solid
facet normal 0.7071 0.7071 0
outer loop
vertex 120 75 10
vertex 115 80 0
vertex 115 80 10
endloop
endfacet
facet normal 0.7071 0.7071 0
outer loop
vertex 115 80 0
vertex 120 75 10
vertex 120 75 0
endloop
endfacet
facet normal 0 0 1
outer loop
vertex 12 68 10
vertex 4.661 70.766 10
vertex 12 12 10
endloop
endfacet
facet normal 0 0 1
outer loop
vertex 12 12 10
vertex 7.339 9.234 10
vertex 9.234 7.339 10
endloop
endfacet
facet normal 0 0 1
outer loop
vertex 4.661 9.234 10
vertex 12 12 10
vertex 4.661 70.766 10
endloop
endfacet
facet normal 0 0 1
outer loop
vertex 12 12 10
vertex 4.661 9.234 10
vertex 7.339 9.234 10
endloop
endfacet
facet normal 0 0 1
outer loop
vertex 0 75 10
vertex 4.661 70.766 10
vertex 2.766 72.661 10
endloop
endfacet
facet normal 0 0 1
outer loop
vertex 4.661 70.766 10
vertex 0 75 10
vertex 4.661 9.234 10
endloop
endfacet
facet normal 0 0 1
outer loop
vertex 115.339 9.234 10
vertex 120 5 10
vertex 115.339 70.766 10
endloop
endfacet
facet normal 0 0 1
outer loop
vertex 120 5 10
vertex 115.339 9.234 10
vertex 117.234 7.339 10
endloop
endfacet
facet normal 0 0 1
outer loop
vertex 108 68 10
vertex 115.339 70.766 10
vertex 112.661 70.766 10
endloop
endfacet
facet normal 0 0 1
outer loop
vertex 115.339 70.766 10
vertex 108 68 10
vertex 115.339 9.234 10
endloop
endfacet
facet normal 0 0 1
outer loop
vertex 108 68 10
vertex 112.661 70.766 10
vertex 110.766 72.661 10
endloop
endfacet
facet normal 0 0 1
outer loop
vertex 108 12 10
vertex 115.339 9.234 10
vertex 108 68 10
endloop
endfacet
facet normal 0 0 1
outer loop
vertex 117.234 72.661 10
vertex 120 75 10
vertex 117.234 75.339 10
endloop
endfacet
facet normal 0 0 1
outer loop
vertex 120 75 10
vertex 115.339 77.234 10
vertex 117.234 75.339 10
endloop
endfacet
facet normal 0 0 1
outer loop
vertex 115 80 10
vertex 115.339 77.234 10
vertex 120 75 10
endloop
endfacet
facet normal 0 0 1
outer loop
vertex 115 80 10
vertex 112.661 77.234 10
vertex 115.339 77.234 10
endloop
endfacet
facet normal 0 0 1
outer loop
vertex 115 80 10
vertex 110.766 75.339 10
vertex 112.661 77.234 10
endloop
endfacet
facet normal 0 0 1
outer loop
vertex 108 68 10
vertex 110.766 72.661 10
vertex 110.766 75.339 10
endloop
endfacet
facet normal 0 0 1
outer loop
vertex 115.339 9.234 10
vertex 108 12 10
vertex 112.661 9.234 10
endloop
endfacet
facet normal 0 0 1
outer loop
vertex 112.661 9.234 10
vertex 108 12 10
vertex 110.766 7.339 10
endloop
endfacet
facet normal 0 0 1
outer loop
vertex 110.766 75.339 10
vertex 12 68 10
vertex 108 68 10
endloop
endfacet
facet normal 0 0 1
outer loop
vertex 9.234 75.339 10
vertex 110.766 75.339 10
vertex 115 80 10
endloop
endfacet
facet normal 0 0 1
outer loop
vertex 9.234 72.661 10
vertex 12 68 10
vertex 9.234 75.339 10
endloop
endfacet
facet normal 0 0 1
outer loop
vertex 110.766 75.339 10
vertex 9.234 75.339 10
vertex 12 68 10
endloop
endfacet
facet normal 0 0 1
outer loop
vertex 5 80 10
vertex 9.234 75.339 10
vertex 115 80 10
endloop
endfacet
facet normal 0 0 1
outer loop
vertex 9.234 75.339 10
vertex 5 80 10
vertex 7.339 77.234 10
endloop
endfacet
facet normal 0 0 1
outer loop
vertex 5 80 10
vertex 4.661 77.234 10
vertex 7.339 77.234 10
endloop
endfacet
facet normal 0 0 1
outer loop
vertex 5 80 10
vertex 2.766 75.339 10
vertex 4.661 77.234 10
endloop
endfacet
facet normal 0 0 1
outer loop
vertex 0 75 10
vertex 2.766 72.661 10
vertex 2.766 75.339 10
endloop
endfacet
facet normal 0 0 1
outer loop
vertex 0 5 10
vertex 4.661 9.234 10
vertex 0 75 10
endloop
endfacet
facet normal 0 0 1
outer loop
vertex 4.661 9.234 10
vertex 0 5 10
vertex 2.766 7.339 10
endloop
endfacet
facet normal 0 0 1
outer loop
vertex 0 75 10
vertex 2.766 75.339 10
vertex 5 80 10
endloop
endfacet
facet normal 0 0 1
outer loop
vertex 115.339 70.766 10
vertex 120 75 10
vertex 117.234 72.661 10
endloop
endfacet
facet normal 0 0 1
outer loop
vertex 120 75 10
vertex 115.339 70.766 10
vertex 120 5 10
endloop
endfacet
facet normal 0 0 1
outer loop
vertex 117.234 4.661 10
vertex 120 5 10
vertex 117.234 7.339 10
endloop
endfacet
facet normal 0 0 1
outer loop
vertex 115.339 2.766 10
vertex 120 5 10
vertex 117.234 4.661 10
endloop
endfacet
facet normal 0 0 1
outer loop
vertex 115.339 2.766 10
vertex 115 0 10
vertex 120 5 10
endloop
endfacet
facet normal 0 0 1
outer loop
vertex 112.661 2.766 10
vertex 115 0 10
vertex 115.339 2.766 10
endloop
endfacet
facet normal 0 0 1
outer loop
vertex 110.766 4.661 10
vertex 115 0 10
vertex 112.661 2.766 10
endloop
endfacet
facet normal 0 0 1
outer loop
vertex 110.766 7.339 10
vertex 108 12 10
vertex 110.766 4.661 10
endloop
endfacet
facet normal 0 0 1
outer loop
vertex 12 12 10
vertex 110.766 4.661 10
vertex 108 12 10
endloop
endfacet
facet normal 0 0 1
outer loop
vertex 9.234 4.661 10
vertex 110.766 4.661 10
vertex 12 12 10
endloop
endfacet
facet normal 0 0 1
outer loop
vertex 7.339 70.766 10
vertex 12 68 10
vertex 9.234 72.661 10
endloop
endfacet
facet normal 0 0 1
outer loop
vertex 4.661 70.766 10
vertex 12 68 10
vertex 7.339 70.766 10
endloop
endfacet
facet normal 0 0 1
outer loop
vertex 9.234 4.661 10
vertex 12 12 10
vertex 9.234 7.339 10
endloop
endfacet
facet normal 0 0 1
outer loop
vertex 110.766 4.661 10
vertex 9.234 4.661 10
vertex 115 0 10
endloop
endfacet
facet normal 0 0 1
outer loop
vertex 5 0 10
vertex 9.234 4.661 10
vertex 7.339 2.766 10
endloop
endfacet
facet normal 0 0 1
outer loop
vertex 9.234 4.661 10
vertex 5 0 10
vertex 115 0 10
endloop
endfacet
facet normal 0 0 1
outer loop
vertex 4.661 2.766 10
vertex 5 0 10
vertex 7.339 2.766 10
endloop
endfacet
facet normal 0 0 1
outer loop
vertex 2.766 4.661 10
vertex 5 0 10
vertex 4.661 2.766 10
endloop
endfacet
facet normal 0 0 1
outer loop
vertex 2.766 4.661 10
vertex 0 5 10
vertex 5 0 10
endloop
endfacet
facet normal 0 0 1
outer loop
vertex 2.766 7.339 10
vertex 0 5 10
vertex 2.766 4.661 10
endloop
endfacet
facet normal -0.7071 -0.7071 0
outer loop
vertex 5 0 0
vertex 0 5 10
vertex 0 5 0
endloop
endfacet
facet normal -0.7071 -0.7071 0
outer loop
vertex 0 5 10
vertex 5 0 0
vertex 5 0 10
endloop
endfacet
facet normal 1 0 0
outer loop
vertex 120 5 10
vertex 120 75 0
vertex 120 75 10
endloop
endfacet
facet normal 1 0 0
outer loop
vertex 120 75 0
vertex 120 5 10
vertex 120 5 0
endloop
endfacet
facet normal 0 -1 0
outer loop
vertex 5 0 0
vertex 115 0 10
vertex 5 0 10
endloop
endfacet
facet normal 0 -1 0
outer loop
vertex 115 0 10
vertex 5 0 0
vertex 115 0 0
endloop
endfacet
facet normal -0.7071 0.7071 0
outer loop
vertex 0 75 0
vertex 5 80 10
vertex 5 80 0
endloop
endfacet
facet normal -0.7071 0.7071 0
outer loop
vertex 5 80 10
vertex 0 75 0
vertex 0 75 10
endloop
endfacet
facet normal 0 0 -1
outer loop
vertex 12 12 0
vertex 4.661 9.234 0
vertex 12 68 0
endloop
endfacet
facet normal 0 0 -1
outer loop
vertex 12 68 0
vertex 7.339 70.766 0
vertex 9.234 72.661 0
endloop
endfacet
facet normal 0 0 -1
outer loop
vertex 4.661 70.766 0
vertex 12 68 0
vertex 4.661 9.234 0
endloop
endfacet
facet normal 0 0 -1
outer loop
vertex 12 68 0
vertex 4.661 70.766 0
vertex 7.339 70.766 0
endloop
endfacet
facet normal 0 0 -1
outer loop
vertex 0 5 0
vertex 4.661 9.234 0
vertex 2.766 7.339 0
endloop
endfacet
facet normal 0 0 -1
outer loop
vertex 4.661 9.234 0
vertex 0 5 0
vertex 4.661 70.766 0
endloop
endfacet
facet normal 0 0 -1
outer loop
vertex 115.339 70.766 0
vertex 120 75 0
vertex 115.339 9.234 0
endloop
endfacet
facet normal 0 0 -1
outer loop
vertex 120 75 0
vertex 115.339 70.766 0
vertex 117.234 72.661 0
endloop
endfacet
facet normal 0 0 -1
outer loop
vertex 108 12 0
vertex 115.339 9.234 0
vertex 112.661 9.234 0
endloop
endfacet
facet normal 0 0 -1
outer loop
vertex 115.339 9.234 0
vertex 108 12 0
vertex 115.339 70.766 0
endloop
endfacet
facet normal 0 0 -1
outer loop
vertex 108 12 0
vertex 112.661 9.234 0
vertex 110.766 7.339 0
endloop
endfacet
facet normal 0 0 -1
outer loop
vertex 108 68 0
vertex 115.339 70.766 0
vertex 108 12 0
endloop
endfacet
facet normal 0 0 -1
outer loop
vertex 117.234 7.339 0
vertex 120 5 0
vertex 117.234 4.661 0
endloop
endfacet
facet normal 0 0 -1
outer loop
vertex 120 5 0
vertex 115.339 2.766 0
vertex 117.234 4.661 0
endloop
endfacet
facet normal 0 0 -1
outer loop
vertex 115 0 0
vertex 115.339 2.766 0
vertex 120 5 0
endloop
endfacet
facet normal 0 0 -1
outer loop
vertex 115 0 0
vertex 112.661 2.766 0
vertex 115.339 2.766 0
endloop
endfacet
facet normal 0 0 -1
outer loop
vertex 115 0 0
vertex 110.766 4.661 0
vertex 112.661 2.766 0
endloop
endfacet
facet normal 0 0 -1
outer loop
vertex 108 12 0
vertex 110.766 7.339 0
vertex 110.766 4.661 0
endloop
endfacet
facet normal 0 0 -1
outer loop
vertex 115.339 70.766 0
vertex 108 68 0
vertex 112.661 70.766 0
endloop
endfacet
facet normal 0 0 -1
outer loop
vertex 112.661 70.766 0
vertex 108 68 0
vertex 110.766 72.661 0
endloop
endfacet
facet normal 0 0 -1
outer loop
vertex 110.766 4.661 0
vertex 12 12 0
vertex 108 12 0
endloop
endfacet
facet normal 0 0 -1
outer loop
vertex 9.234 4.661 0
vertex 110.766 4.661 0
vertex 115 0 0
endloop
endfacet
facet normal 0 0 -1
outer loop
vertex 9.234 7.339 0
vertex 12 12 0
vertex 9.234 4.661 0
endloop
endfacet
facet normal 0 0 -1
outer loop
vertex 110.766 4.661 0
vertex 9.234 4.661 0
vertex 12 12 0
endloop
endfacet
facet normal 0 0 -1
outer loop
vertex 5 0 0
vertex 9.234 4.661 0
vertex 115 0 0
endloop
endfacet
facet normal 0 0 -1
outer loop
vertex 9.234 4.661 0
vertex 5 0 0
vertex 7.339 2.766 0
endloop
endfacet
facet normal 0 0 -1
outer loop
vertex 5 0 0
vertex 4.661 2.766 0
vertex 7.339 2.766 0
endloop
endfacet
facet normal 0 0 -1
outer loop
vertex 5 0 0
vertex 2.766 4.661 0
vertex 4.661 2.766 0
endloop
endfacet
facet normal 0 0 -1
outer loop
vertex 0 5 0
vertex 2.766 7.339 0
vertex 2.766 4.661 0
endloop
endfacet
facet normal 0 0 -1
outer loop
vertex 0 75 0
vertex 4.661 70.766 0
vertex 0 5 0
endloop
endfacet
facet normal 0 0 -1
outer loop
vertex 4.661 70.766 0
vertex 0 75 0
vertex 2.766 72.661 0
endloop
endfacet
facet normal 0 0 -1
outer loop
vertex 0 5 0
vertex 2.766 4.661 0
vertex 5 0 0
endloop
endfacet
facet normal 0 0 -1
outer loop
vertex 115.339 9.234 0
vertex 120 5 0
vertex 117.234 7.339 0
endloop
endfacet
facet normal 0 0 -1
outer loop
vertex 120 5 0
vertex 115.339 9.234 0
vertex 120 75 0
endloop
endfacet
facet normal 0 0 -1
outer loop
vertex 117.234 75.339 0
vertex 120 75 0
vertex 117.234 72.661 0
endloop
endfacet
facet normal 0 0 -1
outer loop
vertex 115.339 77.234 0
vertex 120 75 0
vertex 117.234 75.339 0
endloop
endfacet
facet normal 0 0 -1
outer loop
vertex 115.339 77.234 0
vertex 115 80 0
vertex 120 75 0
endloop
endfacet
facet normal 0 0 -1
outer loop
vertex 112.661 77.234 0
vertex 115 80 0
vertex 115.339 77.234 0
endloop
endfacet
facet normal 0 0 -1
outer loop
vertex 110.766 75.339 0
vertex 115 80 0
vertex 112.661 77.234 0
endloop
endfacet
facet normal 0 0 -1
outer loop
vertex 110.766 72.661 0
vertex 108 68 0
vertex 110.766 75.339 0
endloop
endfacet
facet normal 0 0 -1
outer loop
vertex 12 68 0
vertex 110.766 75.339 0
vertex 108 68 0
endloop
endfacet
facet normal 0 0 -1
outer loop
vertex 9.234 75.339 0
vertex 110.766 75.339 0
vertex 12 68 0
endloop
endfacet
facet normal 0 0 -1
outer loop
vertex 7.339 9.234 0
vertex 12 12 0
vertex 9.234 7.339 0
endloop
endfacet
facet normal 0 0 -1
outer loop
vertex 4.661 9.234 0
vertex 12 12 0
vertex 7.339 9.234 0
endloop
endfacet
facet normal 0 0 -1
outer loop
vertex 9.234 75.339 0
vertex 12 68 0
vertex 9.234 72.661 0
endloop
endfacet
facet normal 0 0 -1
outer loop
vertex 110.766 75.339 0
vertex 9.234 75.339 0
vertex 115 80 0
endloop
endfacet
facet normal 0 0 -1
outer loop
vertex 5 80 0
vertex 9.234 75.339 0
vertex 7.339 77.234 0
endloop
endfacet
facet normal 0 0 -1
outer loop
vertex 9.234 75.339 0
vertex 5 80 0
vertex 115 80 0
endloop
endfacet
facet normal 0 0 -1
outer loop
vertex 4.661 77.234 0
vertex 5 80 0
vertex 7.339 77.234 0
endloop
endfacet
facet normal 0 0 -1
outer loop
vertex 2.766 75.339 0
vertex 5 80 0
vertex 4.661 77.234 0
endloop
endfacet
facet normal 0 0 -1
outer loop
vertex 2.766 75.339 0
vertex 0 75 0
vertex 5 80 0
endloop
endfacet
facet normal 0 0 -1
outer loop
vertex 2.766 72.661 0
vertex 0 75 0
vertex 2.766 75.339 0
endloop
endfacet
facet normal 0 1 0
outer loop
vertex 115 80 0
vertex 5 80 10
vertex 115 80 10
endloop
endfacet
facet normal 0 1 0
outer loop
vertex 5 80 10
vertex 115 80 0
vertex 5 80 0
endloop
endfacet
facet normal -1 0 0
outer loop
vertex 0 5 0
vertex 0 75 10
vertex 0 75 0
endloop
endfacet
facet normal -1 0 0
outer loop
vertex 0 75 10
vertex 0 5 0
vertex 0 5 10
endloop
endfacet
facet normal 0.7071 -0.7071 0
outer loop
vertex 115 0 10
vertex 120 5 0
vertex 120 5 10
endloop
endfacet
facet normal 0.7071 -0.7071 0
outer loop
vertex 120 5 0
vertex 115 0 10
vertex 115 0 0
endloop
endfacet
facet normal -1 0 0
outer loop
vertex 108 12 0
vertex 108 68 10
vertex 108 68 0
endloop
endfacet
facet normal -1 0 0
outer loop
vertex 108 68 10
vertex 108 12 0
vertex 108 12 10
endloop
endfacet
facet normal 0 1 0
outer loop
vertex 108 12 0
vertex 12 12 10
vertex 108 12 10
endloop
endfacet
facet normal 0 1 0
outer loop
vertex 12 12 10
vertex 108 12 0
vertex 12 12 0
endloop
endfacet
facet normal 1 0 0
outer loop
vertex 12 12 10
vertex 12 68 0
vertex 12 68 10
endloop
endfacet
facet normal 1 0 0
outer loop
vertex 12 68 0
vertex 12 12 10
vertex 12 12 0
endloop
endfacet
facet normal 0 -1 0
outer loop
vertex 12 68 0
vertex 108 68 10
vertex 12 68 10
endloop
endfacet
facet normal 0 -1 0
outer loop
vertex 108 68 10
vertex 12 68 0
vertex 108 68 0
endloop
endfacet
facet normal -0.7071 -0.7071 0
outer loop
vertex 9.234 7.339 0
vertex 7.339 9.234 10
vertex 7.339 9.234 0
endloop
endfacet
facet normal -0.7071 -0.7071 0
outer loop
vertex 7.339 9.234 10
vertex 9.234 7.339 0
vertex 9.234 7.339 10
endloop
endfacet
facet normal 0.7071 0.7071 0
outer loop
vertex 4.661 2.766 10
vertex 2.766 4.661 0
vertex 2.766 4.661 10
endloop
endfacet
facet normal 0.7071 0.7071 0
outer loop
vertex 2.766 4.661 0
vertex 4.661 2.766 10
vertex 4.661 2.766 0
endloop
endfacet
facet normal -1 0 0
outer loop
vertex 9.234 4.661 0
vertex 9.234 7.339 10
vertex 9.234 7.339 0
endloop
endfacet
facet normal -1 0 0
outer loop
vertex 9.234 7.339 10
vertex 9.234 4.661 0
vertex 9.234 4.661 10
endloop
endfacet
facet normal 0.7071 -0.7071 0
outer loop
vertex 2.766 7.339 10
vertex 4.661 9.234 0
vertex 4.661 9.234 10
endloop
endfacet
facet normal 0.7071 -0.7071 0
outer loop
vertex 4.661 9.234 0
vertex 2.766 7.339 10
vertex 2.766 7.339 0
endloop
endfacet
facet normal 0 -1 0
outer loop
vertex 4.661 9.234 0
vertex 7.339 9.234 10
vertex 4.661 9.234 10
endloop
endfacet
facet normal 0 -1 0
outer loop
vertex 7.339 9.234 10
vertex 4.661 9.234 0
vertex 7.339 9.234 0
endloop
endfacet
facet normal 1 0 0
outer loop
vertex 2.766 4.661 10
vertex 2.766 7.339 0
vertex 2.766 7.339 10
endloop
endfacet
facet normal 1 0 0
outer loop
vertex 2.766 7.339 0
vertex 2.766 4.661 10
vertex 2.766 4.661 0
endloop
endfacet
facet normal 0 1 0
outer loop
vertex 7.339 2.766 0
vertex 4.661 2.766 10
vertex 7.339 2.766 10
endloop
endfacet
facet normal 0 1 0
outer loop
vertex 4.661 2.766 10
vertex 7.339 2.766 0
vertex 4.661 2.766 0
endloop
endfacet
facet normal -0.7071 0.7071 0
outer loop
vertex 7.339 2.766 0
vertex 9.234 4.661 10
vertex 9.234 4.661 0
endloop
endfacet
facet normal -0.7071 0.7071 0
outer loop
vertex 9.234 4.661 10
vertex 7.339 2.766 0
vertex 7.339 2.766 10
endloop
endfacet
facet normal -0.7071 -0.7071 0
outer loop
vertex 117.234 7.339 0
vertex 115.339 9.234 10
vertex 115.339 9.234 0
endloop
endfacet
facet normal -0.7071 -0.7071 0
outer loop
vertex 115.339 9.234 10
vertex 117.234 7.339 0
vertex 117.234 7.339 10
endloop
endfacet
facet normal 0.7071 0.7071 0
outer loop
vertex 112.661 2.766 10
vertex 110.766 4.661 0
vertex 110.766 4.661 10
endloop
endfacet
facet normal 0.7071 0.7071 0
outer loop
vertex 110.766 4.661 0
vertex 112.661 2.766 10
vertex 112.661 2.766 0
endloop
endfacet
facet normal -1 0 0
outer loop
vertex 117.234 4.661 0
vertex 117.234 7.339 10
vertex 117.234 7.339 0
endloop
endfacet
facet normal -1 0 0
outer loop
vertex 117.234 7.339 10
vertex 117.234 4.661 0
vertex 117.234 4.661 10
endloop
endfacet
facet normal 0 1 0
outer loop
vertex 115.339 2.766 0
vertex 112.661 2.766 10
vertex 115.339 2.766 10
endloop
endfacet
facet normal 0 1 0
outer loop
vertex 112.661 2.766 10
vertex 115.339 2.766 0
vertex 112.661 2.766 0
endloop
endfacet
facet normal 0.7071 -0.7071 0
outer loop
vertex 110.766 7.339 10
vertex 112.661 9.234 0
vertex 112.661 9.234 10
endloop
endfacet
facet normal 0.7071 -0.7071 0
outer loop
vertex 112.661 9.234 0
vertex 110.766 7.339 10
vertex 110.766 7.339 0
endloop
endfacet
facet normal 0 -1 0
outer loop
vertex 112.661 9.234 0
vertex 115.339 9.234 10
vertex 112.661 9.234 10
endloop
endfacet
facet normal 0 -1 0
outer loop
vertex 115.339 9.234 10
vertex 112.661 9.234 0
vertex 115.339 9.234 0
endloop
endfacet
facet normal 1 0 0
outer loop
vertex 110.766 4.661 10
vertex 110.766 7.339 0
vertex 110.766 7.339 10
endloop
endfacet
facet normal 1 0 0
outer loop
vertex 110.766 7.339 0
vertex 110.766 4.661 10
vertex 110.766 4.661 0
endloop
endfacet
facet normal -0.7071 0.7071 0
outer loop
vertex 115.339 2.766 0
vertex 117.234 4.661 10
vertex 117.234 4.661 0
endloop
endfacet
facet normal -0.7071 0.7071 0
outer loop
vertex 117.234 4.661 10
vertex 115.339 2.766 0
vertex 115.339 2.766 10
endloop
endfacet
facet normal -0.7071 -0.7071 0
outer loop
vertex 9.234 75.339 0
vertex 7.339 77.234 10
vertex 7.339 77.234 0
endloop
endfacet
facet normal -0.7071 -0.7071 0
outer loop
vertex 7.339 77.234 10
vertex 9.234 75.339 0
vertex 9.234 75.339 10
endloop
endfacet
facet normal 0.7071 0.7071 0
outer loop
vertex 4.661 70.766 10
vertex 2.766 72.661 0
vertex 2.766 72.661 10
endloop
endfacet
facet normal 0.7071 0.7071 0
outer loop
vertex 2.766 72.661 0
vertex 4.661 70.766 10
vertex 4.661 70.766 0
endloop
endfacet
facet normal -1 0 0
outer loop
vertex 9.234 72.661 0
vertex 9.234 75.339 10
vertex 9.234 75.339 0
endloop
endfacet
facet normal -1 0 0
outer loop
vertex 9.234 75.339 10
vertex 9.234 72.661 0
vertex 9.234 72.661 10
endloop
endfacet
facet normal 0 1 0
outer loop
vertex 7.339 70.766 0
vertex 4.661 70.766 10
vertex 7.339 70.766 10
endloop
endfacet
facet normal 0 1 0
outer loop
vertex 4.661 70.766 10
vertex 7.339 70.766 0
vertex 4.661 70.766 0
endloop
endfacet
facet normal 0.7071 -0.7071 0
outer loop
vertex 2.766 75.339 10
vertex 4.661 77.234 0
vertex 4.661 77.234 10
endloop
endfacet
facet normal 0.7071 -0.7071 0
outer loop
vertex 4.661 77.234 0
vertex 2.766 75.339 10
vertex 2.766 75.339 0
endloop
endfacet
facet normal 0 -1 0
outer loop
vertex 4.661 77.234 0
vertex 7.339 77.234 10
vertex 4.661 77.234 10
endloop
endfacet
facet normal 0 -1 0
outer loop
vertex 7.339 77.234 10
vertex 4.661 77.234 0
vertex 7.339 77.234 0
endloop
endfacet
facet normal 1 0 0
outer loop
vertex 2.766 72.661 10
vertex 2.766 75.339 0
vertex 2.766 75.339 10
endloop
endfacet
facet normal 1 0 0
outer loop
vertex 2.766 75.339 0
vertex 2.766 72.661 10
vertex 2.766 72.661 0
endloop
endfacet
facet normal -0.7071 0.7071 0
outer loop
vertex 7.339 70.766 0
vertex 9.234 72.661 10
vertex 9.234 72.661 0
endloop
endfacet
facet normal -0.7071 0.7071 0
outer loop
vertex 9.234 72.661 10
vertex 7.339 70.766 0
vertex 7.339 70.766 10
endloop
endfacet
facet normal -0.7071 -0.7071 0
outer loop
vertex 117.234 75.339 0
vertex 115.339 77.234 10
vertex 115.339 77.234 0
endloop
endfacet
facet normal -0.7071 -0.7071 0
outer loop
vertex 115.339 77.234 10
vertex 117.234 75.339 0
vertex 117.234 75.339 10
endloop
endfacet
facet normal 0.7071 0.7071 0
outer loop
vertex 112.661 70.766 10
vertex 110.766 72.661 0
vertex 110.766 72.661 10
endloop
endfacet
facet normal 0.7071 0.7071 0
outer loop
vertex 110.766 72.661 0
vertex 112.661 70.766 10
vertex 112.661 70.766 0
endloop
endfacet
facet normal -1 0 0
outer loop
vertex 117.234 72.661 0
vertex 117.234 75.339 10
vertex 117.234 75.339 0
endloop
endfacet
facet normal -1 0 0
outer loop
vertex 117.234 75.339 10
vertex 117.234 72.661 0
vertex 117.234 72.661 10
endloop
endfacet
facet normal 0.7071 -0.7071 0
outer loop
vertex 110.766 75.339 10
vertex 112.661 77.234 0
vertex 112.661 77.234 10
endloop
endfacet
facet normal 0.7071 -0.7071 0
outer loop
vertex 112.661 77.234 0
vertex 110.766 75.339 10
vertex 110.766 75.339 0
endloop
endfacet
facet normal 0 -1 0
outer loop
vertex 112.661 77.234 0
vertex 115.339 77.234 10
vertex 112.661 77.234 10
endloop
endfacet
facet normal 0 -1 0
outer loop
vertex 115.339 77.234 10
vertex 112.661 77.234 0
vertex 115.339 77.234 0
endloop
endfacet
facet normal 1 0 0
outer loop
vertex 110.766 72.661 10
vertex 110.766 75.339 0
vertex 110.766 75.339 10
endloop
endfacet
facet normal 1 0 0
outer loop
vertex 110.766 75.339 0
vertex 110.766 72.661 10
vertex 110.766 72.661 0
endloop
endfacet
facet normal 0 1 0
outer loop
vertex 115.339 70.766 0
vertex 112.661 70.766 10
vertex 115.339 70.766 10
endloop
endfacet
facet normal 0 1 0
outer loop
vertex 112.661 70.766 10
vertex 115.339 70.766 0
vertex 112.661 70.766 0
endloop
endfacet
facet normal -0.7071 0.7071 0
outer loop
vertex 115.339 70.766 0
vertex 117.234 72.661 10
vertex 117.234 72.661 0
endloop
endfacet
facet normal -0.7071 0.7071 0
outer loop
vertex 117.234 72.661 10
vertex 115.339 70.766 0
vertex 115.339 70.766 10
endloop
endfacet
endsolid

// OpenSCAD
$fn = 32;

// ----------------------------------------------------------------------
// Frame plate: 120 x 80 frame, 12 mm rails
// ----------------------------------------------------------------------

// --- parameters (mm) ---
plate_l = 120;            // plate length, X
plate_w = 80;             // plate width, Y
plate_t = 10;             // plate thickness, Z (extrusion height)
corner_c = 5;             // corner chamfer
frame_bar = 12;           // frame rail width
bolt_r = 3.5;             // corner bolt window radius
bolt_inset = 6;           // bolt centre inset from the edges
fit_tol = 0.1;            // declared fit tolerance (prompt contract)
free_tol = 0.3;           // declared free tolerance (prompt contract)

win_l = plate_l - 2 * frame_bar;  // window length
win_w = plate_w - 2 * frame_bar;  // window width
bolt_d = 2 * bolt_r;  // corner hole diameter

profile = [[5, 0], [115, 0], [120, 5], [120, 75], [115, 80], [5, 80], [0, 75], [0, 5]];  // primary outline, 8 points, counter clockwise
void_1 = [[12, 12], [108, 12], [108, 68], [12, 68]];  // the window, 4 points
void_2 = [[9.234, 7.339], [7.339, 9.234], [4.661, 9.234], [2.766, 7.339], [2.766, 4.661], [4.661, 2.766], [7.339, 2.766], [9.234, 4.661]];  // corner bolt window, 8 points
void_3 = [[117.234, 7.339], [115.339, 9.234], [112.661, 9.234], [110.766, 7.339], [110.766, 4.661], [112.661, 2.766], [115.339, 2.766], [117.234, 4.661]];  // corner bolt window, 8 points
void_4 = [[9.234, 75.339], [7.339, 77.234], [4.661, 77.234], [2.766, 75.339], [2.766, 72.661], [4.661, 70.766], [7.339, 70.766], [9.234, 72.661]];  // corner bolt window, 8 points
void_5 = [[117.234, 75.339], [115.339, 77.234], [112.661, 77.234], [110.766, 75.339], [110.766, 72.661], [112.661, 70.766], [115.339, 70.766], [117.234, 72.661]];  // corner bolt window, 8 points

// --- the one profile operation ---
difference() {
  linear_extrude(height = plate_t) polygon(points = profile);
  translate([0, 0, -1])
    linear_extrude(height = plate_t + 2) polygon(points = void_1);
  translate([0, 0, -1])
    linear_extrude(height = plate_t + 2) polygon(points = void_2);
  translate([0, 0, -1])
    linear_extrude(height = plate_t + 2) polygon(points = void_3);
  translate([0, 0, -1])
    linear_extrude(height = plate_t + 2) polygon(points = void_4);
  translate([0, 0, -1])
    linear_extrude(height = plate_t + 2) polygon(points = void_5);
}
